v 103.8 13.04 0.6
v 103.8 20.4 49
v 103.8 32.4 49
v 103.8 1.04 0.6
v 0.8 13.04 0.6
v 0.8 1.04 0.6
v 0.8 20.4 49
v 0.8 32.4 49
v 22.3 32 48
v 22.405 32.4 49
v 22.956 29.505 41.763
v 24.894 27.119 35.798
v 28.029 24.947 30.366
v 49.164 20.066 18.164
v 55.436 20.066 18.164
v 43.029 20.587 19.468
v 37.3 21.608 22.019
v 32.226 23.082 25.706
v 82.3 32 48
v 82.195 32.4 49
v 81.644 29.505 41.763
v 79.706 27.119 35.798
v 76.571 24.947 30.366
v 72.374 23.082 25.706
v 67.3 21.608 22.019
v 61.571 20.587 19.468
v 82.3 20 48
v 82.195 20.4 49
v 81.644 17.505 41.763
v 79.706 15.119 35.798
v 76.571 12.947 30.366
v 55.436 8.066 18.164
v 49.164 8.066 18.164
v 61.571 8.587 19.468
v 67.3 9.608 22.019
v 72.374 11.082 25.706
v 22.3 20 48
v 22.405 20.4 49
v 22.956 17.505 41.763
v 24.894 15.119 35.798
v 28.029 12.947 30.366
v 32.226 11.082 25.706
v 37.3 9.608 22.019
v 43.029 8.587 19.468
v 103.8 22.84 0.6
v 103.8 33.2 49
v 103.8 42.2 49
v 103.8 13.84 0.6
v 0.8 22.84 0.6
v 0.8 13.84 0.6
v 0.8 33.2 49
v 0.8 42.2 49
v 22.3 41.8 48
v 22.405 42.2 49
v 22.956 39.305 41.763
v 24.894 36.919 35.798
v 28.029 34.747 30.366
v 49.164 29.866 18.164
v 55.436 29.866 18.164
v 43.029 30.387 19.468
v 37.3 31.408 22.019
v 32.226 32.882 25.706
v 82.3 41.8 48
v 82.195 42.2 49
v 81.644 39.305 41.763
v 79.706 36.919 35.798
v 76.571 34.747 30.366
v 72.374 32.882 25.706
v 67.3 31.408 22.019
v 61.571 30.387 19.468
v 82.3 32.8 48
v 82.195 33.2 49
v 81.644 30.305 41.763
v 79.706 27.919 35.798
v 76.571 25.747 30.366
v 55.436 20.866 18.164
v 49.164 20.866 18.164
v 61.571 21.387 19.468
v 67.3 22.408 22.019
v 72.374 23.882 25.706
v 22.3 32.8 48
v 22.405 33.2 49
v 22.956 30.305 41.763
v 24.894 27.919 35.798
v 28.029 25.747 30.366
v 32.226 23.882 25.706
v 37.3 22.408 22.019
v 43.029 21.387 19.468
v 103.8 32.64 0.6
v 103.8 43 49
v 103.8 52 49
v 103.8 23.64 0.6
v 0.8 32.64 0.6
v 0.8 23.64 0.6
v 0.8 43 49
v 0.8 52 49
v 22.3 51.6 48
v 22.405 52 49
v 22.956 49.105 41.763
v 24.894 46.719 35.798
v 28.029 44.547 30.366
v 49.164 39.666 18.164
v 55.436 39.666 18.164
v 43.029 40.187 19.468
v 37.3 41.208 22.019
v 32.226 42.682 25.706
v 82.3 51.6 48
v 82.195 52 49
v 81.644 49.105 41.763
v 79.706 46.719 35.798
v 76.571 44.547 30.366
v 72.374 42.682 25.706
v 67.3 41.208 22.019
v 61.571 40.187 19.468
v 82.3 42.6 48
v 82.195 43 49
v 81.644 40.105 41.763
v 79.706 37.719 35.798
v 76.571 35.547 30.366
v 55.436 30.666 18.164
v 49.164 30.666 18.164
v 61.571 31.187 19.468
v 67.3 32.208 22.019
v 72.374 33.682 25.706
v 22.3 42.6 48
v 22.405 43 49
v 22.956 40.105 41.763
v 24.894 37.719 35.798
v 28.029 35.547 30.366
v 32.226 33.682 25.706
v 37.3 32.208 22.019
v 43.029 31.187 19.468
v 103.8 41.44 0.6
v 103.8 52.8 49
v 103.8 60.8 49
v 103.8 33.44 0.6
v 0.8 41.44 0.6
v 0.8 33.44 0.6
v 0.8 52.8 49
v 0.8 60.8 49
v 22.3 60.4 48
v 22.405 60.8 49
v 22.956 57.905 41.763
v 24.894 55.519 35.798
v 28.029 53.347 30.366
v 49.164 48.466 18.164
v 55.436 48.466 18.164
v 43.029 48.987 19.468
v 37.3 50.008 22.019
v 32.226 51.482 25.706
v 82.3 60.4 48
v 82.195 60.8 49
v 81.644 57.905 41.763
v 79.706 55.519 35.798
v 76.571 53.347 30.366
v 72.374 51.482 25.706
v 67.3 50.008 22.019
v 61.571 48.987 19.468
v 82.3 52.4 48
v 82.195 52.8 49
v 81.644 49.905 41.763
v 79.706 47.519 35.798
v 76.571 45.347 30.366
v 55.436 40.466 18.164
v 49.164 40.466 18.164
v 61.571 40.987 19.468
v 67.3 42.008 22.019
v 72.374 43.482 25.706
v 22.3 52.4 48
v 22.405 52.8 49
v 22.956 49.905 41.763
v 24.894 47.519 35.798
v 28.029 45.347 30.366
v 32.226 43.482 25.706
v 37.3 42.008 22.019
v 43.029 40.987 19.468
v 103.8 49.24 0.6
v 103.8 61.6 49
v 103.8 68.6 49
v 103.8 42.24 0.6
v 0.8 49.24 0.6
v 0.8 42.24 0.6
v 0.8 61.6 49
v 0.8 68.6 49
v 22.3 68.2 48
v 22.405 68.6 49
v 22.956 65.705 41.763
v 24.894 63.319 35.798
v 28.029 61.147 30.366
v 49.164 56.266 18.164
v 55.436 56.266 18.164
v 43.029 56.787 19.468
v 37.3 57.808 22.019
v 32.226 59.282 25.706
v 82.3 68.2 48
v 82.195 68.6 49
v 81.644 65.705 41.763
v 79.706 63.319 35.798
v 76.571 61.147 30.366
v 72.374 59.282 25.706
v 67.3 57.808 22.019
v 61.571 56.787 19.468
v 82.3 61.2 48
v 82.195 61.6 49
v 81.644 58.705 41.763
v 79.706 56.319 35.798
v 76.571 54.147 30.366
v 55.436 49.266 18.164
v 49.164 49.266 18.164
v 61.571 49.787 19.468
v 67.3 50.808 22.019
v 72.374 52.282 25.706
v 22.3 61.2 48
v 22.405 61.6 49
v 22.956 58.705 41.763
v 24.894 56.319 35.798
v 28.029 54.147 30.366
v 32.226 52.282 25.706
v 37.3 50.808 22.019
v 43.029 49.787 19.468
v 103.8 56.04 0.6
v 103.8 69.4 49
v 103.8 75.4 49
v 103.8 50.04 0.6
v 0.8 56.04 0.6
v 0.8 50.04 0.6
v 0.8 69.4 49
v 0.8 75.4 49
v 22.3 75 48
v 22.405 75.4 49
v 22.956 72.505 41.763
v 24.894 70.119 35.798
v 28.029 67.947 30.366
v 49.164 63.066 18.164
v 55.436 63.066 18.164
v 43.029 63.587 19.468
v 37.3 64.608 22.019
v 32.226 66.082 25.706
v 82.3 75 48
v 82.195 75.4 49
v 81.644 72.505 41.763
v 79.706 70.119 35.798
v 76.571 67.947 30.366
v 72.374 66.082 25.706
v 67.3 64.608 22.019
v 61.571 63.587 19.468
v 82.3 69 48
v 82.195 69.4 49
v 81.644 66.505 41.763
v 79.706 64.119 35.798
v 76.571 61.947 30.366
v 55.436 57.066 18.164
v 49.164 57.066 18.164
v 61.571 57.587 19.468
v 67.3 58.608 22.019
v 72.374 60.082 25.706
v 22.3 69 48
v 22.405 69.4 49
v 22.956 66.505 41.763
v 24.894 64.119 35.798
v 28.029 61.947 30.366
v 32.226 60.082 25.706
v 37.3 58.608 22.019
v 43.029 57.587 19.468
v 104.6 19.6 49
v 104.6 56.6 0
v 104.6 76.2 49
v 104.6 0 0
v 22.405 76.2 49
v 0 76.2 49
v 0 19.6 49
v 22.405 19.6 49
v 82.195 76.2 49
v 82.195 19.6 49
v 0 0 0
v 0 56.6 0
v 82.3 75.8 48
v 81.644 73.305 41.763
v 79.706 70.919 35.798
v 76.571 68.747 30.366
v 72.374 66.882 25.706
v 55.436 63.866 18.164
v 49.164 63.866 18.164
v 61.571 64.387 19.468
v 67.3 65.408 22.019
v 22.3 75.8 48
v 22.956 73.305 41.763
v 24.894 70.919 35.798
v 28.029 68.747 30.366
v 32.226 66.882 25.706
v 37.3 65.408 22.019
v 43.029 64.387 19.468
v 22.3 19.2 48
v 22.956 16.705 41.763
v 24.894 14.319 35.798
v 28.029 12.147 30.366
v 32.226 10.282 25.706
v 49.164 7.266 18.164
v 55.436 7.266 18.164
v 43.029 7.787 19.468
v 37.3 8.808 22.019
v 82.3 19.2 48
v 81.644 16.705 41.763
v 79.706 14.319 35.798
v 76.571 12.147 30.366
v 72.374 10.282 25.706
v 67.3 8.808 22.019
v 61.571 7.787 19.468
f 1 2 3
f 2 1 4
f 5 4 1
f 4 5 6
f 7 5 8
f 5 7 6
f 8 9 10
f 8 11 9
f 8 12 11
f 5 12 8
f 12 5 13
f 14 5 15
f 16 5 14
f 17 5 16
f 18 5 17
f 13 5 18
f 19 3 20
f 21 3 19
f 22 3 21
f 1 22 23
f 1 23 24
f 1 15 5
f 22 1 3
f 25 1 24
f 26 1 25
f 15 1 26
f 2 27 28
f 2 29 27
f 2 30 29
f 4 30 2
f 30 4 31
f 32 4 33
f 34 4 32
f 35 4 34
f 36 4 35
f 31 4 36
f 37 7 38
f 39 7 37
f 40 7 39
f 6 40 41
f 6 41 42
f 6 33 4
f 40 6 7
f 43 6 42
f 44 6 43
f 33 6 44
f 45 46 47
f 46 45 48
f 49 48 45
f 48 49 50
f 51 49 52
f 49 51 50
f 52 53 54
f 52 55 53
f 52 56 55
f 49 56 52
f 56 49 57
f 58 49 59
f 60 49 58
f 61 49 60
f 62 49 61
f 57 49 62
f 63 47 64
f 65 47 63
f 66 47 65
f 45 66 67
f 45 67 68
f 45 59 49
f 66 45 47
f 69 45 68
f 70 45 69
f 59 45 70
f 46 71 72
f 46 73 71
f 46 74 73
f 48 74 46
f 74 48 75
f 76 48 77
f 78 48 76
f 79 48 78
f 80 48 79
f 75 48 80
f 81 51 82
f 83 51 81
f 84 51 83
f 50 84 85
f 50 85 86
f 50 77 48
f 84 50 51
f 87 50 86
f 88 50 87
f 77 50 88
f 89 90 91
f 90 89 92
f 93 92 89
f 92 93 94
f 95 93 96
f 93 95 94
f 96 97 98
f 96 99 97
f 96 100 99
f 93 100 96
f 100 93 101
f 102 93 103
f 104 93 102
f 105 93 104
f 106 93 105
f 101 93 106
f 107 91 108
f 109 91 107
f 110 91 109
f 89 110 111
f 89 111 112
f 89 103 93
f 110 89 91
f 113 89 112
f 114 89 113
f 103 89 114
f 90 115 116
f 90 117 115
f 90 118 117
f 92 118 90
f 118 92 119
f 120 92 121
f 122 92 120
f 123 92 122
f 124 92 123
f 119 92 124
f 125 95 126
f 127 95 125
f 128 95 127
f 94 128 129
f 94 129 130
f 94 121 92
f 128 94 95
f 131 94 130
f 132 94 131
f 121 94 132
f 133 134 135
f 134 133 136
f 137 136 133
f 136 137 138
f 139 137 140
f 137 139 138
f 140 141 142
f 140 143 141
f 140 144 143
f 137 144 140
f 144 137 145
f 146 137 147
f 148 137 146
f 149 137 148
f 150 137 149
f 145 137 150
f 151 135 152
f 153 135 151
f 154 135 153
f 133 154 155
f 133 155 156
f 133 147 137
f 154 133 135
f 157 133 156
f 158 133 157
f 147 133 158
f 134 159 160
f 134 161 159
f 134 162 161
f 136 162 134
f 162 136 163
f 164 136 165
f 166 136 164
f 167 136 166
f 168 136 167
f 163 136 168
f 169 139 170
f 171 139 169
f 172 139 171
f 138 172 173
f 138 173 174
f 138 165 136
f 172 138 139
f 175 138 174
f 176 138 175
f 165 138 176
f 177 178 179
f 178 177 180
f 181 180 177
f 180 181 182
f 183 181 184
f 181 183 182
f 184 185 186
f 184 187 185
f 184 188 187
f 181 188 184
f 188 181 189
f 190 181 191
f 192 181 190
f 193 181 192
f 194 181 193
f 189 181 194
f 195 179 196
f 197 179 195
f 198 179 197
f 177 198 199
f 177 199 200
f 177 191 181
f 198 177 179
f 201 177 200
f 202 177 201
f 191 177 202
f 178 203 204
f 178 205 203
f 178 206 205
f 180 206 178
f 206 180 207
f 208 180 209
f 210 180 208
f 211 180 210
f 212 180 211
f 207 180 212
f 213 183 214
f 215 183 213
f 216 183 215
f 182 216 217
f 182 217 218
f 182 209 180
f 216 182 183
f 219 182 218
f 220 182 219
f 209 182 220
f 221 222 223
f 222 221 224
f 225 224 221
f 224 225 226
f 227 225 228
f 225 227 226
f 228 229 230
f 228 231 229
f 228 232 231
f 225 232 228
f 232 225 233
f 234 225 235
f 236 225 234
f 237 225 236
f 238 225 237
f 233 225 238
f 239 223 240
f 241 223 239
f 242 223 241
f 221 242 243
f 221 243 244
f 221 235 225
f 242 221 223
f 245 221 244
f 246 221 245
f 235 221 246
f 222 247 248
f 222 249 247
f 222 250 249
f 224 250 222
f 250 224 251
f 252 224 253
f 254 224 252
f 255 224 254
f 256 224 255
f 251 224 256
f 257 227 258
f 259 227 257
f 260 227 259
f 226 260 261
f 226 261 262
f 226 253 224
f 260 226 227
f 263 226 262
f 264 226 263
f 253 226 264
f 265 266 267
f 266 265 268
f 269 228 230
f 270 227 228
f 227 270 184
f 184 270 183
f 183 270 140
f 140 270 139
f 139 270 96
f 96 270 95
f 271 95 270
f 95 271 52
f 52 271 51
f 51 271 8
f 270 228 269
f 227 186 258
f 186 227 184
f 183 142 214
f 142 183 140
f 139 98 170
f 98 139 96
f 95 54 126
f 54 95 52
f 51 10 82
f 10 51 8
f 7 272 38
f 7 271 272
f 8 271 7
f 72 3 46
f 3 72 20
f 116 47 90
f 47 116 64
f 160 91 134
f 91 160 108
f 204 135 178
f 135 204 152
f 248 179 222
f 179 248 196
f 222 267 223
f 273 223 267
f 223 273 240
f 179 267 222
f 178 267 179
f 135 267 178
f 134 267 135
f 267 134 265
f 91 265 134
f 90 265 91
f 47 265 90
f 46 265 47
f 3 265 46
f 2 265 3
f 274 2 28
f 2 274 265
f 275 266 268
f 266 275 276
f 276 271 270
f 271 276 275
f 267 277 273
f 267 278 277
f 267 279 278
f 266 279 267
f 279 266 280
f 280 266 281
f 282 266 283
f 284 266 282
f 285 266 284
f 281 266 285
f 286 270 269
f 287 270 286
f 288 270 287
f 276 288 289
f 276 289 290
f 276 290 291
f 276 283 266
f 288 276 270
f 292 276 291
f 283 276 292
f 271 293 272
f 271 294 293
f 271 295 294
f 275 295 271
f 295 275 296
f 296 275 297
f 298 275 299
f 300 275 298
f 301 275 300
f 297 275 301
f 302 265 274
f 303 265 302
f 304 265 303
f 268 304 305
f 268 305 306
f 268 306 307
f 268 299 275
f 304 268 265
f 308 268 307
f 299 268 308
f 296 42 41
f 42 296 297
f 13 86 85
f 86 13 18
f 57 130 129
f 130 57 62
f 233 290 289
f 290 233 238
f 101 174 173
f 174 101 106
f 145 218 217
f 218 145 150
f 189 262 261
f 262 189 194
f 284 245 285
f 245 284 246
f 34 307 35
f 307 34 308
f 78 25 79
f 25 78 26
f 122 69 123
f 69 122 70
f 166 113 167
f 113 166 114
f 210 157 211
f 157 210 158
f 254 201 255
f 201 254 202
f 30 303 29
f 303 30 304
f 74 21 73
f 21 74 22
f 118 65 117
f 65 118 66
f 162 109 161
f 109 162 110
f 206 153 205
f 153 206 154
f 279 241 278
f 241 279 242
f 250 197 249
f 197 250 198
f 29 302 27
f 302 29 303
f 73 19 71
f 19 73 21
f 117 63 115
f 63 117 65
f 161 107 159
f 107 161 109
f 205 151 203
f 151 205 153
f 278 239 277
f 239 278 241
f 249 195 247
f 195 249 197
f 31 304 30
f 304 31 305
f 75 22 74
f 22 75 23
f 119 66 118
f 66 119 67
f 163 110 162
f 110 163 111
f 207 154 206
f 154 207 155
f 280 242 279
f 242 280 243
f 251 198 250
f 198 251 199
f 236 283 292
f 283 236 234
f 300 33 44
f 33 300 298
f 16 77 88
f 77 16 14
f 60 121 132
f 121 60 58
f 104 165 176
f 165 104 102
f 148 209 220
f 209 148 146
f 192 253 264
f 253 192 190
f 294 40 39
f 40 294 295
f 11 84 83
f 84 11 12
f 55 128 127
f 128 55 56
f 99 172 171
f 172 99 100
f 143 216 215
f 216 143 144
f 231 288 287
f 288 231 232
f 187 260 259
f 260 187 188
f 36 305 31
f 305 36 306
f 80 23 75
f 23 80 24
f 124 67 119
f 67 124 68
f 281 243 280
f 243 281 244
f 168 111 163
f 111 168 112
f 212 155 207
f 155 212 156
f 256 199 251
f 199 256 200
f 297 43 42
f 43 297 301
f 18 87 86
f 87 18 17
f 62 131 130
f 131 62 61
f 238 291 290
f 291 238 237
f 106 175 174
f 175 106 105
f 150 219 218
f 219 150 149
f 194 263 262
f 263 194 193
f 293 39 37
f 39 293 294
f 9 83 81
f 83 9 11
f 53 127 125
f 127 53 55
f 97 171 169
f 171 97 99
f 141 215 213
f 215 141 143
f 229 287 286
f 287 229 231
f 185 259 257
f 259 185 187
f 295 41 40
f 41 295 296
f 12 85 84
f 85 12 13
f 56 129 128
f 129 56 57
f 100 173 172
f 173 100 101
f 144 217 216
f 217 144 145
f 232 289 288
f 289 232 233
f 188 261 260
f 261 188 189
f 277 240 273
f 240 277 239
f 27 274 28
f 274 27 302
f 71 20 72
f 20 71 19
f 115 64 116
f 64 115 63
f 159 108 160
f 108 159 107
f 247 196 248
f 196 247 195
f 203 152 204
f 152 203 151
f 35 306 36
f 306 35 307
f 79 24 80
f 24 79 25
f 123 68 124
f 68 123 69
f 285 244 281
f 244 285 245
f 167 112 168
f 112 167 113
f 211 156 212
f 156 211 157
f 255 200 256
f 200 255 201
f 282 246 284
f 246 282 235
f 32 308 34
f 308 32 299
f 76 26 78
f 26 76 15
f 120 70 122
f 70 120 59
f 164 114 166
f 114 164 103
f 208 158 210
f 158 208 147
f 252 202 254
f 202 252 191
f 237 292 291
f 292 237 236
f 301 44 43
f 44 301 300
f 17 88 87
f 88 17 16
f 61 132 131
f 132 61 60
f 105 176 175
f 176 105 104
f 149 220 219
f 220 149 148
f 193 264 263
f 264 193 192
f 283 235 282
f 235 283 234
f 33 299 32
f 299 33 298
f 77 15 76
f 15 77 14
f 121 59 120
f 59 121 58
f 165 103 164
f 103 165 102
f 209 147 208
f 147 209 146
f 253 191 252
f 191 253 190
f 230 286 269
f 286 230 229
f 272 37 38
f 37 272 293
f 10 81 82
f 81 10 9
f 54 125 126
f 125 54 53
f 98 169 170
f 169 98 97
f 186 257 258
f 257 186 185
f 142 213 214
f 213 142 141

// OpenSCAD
// KingsOfAirAndSteam

wall = 0.8;
flr = 0.6;

// ships tray
module shipsTray() {
    cx = (210 - wall*5) / 4;
    cy = 60;
    difference() {
        cube([210,60*2+wall*3,37]);
        for (x=[0:3])
            for (y=[0:1])
                translate([wall+x*(wall+cx),wall+y*(wall+cy),flr])
                    cube([cx,cy,99]);
    }
}

//shipsTray();

// big hex stabilizers
module cornerBox() {
    difference() {
        z = 0.6;
        x1 = z * 105;
        y1 = 83 - z * (60);
        linear_extrude(14) polygon([[0,0],[105,0], [105,23], [0,83]]);
        translate([0,0,flr]) linear_extrude(14) {
            offset(delta=-wall) polygon([[0,0],[0,y1],[x1,0]]);
            offset(delta=-wall) polygon([[0,y1],[x1,0],[x1,y1]]);
            offset(delta=-wall) polygon([[0,y1],[0,83],[x1,y1]]);
            offset(delta=-wall) polygon([[x1,y1],[105,23],[105,0],[x1,0]]);
        }
    }
}

//cornerBox();

//scale([-1,1,1]) cornerBox();

function solveY(x) = (x < 105)? 106 - x/105 * 60 : (x - 105)/105 * 60 + 46;

module resourceTray() {
    difference() {
        z = 0.6;
        x1 = 35;
        x2 = 80;
        x3 = 210 - x2;
        x4 = 210 - x1;
        linear_extrude(14) polygon([[0,0],[210,0], [210,106], [105,46], [0,106]]);
        translate([0,0,flr]) linear_extrude(14) {
            offset(delta=-wall) polygon([[0,0],[x1,0],[x1,solveY(x1)],[0,solveY(0)]]);
            offset(delta=-wall) polygon([[x1,0],[x2,0],[x2,solveY(x2)],[x1,solveY(x1)]]);
            offset(delta=-wall) polygon([[x2,0],[x3,0],[x3,solveY(x3)],[105,46],[x2,solveY(x2)]]);
            offset(delta=-wall) polygon([[x3,0],[x4,0],[x4,solveY(x4)],[x3,solveY(x3)]]);
            offset(delta=-wall) polygon([[x4,0],[210,0],[210,solveY(210)],[x4,solveY(x4)]]);
        }
    }
}

//resourceTray();

//cornerBox();

module captainBox(nw) {
    thick = 35.4 - wall * 2 - 0.4;
    cell = (thick - ((nw+1) * wall)) / nw;
    difference() {
        cube([90+wall*2,thick,65+wall*2]);
        for (i=[0:nw-1]) {
            translate([wall,wall+i*(wall+cell),flr])
                cube([90,cell,99]);
        }
        translate([35,-1,30]) cube([20,99,99]);
        translate([45,-1,30]) rotate([-90,0,0]) cylinder(h=99,d=20);
    }
    
    translate([0,40,0]) difference() {
        cube([90+wall*2+0.4+wall*2,35.4,65+wall*2+0.4+wall*2]);
        translate([wall,wall,flr]) cube([90+wall*2+0.4,35.4-wall*2,65+wall*4]);
        translate([45+wall*2+0.2,-1,68]) rotate([-90,0,0]) cylinder(h=99,d=30);
    }
}

//captainBox(3);
//captainBox(4);

function sum(margin,list,stop) =
    margin + list[stop] + (stop? sum(margin,list,stop-1) : 0);


module moneyBox() {
    margin = 4;
    wells = [8,5,5,4,3,2];
    multmatrix([[1 ,0 ,0, 0], [0, 1, 0.4, 0], [0, 0, 1, 0]]) difference() {
        cube([103+wall*2,wall+sum(margin+wall,wells,len(wells)-1),49]);
        for(i=[0:len(wells)-1])
            translate([wall,wall+(i?sum(margin+wall,wells,i-1):0),flr]) 
                cube([103,margin+wells[i],99]);
        translate([(103+wall*2)/2,-1,48]) rotate([-90,0,0]) cylinder(h=99,d=60);
    }
}

// rotate([17,0,0]) 
moneyBox();
